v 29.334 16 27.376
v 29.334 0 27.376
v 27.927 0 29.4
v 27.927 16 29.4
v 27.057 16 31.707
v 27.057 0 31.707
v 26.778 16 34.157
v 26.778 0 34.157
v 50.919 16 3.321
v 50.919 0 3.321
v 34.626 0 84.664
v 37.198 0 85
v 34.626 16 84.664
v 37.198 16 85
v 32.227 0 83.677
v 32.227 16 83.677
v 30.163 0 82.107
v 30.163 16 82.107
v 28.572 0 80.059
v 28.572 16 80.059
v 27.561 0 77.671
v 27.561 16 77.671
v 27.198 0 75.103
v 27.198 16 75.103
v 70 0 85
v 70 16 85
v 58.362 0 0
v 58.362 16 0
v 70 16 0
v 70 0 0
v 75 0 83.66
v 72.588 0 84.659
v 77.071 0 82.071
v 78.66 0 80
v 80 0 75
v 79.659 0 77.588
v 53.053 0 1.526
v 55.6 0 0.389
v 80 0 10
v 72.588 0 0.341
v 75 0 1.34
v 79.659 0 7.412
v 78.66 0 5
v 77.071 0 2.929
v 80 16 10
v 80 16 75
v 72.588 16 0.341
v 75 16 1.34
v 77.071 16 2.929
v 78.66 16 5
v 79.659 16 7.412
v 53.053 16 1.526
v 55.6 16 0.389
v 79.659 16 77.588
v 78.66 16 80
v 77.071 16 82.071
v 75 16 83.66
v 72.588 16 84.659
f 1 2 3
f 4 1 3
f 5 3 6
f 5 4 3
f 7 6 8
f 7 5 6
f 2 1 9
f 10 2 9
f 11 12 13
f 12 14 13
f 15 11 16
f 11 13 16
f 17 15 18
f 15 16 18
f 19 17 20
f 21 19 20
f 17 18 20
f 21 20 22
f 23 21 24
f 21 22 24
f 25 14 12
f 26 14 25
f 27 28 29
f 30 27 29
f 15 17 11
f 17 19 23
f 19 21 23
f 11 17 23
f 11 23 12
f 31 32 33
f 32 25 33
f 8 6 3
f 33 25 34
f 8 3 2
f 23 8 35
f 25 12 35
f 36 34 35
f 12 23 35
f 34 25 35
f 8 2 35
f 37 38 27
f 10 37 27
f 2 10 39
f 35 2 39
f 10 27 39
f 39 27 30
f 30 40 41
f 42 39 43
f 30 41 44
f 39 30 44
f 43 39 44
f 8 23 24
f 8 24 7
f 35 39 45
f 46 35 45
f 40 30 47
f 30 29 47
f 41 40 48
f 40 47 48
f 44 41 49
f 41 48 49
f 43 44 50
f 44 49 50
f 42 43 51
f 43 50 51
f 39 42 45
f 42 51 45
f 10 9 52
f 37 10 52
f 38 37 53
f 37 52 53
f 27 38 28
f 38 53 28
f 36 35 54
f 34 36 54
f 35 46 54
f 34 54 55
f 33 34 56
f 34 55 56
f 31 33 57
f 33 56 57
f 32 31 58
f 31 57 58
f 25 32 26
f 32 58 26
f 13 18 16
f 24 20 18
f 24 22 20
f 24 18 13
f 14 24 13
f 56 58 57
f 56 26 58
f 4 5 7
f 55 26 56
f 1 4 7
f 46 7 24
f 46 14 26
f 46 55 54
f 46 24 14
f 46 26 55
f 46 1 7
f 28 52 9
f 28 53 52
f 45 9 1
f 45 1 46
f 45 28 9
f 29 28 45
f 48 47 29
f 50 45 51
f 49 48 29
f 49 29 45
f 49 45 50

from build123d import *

# Parameters (mm, degrees)
ESQUISSE1_W             = 80
ESQUISSE1_H             = 16
BOSS_EXTRU_1_DEPTH      = 85
ENL_V_MAT_EXTRU_1_DEPTH = 118.817655723
CONG_1_R                = 10
ENL_V_MAT_EXTRU_2_DEPTH = 118.817655723
CONG_2_R                = 10


with BuildPart() as part:
    # Esquisse1 → Boss.-Extru.1 (new body)
    with BuildSketch(Plane.XY):
        with Locations((40, 8)):
            Rectangle(ESQUISSE1_W, ESQUISSE1_H)
    extrude(amount=BOSS_EXTRU_1_DEPTH)

    # Esquisse4 → Enlèv. mat.-Extru.1 (cut, through all)
    with BuildSketch(Plane(origin=(0, 16, 0), x_dir=(1, 0, 0), z_dir=(0, 1, 0))):
        with BuildLine():
            Line((0, 0), (0, -60.067381304))
            Line((0, -60.067381304), (50.91884997, -3.321412558))
            ThreePointArc((50.91884997, -3.321412558), (54.286554034, -0.868026653), (58.361730446, 0))
            Line((58.361730446, 0), (0, 0))
        make_face()
    extrude(amount=-ENL_V_MAT_EXTRU_1_DEPTH, mode=Mode.SUBTRACT)

    # Congé1
    cong_1_edges = [part.edges().sort_by_distance(p)[0] for p in [
        (0, 8, 60.067381304),
    ]]
    fillet(cong_1_edges, radius=CONG_1_R)

    # Esquisse5 → Enlèv. mat.-Extru.2 (cut, through all)
    with BuildSketch(Plane(origin=(0, 0, 0), x_dir=(-1, 0, 0), z_dir=(0, -1, 0))):
        Polygon((-27.29979965, -85), (-26.737984747, -30.269519654), (25.961948545, -37.418966658), (23.023106213, -85), align=None)
    extrude(amount=-ENL_V_MAT_EXTRU_2_DEPTH, mode=Mode.SUBTRACT)

    # Congé2
    cong_2_edges = [part.edges().sort_by_distance(p)[0] for p in [
        (80, 8, 85),
        (27.29979965, 8, 85),
        (26.737984747, 8, 30.269519654),
        (80, 8, 0),
    ]]
    fillet(cong_2_edges, radius=CONG_2_R)


solid = part.part
